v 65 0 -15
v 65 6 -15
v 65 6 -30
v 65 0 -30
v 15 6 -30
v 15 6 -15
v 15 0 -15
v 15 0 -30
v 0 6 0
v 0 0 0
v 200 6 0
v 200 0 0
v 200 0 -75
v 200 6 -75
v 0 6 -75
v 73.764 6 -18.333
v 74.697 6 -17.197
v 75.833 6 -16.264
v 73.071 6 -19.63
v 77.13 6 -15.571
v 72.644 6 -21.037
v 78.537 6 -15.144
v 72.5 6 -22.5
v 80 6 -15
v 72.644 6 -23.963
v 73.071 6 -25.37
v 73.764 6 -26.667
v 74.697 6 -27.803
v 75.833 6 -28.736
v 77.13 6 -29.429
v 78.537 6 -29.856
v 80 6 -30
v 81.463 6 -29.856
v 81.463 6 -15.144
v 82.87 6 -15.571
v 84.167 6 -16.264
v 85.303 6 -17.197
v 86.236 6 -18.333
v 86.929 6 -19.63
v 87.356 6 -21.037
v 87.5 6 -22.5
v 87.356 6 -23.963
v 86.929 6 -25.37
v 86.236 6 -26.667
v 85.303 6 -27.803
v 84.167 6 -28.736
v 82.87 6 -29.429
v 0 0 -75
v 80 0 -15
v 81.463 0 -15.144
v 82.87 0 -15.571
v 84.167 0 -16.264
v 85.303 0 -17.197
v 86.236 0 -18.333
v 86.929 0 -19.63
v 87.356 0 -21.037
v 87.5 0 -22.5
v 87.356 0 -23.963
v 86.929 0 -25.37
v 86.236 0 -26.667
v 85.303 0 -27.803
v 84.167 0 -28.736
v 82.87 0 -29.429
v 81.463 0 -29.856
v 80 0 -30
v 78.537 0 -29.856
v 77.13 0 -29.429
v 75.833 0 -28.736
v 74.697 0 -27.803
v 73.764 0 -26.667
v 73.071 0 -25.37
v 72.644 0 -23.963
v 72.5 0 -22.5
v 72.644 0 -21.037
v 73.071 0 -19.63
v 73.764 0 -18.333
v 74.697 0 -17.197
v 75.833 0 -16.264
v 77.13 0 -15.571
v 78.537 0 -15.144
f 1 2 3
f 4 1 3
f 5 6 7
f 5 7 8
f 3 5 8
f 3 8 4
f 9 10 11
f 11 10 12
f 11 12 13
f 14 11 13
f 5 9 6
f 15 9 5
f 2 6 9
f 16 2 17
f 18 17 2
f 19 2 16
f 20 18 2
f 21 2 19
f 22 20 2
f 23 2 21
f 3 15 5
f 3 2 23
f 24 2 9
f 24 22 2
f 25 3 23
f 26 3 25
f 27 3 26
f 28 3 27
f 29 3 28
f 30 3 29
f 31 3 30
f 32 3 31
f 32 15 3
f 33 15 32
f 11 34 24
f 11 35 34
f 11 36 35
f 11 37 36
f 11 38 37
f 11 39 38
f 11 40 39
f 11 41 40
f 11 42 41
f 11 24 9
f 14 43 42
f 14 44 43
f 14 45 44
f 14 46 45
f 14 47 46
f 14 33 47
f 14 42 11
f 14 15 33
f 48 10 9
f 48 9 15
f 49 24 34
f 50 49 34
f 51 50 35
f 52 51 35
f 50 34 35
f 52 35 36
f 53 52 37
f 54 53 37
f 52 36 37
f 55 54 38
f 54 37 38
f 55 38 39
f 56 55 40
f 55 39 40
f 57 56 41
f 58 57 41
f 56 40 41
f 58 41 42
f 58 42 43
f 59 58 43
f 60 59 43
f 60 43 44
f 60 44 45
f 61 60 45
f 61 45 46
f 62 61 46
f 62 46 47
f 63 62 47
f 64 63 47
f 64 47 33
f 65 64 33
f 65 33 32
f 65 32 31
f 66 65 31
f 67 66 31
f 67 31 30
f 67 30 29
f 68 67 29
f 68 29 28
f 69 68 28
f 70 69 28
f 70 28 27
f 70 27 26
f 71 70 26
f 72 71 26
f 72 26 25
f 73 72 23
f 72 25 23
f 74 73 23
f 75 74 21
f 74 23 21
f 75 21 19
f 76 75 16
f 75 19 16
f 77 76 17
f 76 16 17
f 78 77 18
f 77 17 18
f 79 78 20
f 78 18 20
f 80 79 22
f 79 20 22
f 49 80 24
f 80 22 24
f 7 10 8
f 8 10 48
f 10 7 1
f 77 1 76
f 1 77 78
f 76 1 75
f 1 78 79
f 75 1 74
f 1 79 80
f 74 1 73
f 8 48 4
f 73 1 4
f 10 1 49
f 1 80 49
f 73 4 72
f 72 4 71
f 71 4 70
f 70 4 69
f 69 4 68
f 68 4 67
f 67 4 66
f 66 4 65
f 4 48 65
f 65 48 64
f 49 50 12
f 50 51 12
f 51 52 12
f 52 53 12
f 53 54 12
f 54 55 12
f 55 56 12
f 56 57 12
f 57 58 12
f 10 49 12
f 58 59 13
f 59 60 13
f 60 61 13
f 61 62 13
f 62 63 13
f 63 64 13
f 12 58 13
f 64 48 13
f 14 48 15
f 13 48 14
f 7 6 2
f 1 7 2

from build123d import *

# Parameters (mm, degrees)
SKETCH1_W           = 200
SKETCH1_H           = 75
BOSS_EXTRUDE1_DEPTH = 6
SKETCH2_R           = 7.5
SKETCH2_W           = 50
SKETCH2_H           = 15
CUT_EXTRUDE1_DEPTH  = 214.684346642


with BuildPart() as part:
    # Sketch1 → Boss-Extrude1 (new body)
    with BuildSketch(Plane(origin=(0, 0, 0), x_dir=(1, 0, 0), z_dir=(0, 1, 0))):
        with Locations((100, 37.5)):
            Rectangle(SKETCH1_W, SKETCH1_H)
    extrude(amount=BOSS_EXTRUDE1_DEPTH)

    # Sketch2 → Cut-Extrude1 (cut, through all)
    with BuildSketch(Plane(origin=(0, 6, 0), x_dir=(1, 0, 0), z_dir=(0, 1, 0))):
        with Locations(Location((80, 22.5, 0), (0, 0, 270))):
            Circle(SKETCH2_R)
        with Locations((40, 22.5)):
            Rectangle(SKETCH2_W, SKETCH2_H)
    extrude(amount=-CUT_EXTRUDE1_DEPTH, mode=Mode.SUBTRACT)


solid = part.part
